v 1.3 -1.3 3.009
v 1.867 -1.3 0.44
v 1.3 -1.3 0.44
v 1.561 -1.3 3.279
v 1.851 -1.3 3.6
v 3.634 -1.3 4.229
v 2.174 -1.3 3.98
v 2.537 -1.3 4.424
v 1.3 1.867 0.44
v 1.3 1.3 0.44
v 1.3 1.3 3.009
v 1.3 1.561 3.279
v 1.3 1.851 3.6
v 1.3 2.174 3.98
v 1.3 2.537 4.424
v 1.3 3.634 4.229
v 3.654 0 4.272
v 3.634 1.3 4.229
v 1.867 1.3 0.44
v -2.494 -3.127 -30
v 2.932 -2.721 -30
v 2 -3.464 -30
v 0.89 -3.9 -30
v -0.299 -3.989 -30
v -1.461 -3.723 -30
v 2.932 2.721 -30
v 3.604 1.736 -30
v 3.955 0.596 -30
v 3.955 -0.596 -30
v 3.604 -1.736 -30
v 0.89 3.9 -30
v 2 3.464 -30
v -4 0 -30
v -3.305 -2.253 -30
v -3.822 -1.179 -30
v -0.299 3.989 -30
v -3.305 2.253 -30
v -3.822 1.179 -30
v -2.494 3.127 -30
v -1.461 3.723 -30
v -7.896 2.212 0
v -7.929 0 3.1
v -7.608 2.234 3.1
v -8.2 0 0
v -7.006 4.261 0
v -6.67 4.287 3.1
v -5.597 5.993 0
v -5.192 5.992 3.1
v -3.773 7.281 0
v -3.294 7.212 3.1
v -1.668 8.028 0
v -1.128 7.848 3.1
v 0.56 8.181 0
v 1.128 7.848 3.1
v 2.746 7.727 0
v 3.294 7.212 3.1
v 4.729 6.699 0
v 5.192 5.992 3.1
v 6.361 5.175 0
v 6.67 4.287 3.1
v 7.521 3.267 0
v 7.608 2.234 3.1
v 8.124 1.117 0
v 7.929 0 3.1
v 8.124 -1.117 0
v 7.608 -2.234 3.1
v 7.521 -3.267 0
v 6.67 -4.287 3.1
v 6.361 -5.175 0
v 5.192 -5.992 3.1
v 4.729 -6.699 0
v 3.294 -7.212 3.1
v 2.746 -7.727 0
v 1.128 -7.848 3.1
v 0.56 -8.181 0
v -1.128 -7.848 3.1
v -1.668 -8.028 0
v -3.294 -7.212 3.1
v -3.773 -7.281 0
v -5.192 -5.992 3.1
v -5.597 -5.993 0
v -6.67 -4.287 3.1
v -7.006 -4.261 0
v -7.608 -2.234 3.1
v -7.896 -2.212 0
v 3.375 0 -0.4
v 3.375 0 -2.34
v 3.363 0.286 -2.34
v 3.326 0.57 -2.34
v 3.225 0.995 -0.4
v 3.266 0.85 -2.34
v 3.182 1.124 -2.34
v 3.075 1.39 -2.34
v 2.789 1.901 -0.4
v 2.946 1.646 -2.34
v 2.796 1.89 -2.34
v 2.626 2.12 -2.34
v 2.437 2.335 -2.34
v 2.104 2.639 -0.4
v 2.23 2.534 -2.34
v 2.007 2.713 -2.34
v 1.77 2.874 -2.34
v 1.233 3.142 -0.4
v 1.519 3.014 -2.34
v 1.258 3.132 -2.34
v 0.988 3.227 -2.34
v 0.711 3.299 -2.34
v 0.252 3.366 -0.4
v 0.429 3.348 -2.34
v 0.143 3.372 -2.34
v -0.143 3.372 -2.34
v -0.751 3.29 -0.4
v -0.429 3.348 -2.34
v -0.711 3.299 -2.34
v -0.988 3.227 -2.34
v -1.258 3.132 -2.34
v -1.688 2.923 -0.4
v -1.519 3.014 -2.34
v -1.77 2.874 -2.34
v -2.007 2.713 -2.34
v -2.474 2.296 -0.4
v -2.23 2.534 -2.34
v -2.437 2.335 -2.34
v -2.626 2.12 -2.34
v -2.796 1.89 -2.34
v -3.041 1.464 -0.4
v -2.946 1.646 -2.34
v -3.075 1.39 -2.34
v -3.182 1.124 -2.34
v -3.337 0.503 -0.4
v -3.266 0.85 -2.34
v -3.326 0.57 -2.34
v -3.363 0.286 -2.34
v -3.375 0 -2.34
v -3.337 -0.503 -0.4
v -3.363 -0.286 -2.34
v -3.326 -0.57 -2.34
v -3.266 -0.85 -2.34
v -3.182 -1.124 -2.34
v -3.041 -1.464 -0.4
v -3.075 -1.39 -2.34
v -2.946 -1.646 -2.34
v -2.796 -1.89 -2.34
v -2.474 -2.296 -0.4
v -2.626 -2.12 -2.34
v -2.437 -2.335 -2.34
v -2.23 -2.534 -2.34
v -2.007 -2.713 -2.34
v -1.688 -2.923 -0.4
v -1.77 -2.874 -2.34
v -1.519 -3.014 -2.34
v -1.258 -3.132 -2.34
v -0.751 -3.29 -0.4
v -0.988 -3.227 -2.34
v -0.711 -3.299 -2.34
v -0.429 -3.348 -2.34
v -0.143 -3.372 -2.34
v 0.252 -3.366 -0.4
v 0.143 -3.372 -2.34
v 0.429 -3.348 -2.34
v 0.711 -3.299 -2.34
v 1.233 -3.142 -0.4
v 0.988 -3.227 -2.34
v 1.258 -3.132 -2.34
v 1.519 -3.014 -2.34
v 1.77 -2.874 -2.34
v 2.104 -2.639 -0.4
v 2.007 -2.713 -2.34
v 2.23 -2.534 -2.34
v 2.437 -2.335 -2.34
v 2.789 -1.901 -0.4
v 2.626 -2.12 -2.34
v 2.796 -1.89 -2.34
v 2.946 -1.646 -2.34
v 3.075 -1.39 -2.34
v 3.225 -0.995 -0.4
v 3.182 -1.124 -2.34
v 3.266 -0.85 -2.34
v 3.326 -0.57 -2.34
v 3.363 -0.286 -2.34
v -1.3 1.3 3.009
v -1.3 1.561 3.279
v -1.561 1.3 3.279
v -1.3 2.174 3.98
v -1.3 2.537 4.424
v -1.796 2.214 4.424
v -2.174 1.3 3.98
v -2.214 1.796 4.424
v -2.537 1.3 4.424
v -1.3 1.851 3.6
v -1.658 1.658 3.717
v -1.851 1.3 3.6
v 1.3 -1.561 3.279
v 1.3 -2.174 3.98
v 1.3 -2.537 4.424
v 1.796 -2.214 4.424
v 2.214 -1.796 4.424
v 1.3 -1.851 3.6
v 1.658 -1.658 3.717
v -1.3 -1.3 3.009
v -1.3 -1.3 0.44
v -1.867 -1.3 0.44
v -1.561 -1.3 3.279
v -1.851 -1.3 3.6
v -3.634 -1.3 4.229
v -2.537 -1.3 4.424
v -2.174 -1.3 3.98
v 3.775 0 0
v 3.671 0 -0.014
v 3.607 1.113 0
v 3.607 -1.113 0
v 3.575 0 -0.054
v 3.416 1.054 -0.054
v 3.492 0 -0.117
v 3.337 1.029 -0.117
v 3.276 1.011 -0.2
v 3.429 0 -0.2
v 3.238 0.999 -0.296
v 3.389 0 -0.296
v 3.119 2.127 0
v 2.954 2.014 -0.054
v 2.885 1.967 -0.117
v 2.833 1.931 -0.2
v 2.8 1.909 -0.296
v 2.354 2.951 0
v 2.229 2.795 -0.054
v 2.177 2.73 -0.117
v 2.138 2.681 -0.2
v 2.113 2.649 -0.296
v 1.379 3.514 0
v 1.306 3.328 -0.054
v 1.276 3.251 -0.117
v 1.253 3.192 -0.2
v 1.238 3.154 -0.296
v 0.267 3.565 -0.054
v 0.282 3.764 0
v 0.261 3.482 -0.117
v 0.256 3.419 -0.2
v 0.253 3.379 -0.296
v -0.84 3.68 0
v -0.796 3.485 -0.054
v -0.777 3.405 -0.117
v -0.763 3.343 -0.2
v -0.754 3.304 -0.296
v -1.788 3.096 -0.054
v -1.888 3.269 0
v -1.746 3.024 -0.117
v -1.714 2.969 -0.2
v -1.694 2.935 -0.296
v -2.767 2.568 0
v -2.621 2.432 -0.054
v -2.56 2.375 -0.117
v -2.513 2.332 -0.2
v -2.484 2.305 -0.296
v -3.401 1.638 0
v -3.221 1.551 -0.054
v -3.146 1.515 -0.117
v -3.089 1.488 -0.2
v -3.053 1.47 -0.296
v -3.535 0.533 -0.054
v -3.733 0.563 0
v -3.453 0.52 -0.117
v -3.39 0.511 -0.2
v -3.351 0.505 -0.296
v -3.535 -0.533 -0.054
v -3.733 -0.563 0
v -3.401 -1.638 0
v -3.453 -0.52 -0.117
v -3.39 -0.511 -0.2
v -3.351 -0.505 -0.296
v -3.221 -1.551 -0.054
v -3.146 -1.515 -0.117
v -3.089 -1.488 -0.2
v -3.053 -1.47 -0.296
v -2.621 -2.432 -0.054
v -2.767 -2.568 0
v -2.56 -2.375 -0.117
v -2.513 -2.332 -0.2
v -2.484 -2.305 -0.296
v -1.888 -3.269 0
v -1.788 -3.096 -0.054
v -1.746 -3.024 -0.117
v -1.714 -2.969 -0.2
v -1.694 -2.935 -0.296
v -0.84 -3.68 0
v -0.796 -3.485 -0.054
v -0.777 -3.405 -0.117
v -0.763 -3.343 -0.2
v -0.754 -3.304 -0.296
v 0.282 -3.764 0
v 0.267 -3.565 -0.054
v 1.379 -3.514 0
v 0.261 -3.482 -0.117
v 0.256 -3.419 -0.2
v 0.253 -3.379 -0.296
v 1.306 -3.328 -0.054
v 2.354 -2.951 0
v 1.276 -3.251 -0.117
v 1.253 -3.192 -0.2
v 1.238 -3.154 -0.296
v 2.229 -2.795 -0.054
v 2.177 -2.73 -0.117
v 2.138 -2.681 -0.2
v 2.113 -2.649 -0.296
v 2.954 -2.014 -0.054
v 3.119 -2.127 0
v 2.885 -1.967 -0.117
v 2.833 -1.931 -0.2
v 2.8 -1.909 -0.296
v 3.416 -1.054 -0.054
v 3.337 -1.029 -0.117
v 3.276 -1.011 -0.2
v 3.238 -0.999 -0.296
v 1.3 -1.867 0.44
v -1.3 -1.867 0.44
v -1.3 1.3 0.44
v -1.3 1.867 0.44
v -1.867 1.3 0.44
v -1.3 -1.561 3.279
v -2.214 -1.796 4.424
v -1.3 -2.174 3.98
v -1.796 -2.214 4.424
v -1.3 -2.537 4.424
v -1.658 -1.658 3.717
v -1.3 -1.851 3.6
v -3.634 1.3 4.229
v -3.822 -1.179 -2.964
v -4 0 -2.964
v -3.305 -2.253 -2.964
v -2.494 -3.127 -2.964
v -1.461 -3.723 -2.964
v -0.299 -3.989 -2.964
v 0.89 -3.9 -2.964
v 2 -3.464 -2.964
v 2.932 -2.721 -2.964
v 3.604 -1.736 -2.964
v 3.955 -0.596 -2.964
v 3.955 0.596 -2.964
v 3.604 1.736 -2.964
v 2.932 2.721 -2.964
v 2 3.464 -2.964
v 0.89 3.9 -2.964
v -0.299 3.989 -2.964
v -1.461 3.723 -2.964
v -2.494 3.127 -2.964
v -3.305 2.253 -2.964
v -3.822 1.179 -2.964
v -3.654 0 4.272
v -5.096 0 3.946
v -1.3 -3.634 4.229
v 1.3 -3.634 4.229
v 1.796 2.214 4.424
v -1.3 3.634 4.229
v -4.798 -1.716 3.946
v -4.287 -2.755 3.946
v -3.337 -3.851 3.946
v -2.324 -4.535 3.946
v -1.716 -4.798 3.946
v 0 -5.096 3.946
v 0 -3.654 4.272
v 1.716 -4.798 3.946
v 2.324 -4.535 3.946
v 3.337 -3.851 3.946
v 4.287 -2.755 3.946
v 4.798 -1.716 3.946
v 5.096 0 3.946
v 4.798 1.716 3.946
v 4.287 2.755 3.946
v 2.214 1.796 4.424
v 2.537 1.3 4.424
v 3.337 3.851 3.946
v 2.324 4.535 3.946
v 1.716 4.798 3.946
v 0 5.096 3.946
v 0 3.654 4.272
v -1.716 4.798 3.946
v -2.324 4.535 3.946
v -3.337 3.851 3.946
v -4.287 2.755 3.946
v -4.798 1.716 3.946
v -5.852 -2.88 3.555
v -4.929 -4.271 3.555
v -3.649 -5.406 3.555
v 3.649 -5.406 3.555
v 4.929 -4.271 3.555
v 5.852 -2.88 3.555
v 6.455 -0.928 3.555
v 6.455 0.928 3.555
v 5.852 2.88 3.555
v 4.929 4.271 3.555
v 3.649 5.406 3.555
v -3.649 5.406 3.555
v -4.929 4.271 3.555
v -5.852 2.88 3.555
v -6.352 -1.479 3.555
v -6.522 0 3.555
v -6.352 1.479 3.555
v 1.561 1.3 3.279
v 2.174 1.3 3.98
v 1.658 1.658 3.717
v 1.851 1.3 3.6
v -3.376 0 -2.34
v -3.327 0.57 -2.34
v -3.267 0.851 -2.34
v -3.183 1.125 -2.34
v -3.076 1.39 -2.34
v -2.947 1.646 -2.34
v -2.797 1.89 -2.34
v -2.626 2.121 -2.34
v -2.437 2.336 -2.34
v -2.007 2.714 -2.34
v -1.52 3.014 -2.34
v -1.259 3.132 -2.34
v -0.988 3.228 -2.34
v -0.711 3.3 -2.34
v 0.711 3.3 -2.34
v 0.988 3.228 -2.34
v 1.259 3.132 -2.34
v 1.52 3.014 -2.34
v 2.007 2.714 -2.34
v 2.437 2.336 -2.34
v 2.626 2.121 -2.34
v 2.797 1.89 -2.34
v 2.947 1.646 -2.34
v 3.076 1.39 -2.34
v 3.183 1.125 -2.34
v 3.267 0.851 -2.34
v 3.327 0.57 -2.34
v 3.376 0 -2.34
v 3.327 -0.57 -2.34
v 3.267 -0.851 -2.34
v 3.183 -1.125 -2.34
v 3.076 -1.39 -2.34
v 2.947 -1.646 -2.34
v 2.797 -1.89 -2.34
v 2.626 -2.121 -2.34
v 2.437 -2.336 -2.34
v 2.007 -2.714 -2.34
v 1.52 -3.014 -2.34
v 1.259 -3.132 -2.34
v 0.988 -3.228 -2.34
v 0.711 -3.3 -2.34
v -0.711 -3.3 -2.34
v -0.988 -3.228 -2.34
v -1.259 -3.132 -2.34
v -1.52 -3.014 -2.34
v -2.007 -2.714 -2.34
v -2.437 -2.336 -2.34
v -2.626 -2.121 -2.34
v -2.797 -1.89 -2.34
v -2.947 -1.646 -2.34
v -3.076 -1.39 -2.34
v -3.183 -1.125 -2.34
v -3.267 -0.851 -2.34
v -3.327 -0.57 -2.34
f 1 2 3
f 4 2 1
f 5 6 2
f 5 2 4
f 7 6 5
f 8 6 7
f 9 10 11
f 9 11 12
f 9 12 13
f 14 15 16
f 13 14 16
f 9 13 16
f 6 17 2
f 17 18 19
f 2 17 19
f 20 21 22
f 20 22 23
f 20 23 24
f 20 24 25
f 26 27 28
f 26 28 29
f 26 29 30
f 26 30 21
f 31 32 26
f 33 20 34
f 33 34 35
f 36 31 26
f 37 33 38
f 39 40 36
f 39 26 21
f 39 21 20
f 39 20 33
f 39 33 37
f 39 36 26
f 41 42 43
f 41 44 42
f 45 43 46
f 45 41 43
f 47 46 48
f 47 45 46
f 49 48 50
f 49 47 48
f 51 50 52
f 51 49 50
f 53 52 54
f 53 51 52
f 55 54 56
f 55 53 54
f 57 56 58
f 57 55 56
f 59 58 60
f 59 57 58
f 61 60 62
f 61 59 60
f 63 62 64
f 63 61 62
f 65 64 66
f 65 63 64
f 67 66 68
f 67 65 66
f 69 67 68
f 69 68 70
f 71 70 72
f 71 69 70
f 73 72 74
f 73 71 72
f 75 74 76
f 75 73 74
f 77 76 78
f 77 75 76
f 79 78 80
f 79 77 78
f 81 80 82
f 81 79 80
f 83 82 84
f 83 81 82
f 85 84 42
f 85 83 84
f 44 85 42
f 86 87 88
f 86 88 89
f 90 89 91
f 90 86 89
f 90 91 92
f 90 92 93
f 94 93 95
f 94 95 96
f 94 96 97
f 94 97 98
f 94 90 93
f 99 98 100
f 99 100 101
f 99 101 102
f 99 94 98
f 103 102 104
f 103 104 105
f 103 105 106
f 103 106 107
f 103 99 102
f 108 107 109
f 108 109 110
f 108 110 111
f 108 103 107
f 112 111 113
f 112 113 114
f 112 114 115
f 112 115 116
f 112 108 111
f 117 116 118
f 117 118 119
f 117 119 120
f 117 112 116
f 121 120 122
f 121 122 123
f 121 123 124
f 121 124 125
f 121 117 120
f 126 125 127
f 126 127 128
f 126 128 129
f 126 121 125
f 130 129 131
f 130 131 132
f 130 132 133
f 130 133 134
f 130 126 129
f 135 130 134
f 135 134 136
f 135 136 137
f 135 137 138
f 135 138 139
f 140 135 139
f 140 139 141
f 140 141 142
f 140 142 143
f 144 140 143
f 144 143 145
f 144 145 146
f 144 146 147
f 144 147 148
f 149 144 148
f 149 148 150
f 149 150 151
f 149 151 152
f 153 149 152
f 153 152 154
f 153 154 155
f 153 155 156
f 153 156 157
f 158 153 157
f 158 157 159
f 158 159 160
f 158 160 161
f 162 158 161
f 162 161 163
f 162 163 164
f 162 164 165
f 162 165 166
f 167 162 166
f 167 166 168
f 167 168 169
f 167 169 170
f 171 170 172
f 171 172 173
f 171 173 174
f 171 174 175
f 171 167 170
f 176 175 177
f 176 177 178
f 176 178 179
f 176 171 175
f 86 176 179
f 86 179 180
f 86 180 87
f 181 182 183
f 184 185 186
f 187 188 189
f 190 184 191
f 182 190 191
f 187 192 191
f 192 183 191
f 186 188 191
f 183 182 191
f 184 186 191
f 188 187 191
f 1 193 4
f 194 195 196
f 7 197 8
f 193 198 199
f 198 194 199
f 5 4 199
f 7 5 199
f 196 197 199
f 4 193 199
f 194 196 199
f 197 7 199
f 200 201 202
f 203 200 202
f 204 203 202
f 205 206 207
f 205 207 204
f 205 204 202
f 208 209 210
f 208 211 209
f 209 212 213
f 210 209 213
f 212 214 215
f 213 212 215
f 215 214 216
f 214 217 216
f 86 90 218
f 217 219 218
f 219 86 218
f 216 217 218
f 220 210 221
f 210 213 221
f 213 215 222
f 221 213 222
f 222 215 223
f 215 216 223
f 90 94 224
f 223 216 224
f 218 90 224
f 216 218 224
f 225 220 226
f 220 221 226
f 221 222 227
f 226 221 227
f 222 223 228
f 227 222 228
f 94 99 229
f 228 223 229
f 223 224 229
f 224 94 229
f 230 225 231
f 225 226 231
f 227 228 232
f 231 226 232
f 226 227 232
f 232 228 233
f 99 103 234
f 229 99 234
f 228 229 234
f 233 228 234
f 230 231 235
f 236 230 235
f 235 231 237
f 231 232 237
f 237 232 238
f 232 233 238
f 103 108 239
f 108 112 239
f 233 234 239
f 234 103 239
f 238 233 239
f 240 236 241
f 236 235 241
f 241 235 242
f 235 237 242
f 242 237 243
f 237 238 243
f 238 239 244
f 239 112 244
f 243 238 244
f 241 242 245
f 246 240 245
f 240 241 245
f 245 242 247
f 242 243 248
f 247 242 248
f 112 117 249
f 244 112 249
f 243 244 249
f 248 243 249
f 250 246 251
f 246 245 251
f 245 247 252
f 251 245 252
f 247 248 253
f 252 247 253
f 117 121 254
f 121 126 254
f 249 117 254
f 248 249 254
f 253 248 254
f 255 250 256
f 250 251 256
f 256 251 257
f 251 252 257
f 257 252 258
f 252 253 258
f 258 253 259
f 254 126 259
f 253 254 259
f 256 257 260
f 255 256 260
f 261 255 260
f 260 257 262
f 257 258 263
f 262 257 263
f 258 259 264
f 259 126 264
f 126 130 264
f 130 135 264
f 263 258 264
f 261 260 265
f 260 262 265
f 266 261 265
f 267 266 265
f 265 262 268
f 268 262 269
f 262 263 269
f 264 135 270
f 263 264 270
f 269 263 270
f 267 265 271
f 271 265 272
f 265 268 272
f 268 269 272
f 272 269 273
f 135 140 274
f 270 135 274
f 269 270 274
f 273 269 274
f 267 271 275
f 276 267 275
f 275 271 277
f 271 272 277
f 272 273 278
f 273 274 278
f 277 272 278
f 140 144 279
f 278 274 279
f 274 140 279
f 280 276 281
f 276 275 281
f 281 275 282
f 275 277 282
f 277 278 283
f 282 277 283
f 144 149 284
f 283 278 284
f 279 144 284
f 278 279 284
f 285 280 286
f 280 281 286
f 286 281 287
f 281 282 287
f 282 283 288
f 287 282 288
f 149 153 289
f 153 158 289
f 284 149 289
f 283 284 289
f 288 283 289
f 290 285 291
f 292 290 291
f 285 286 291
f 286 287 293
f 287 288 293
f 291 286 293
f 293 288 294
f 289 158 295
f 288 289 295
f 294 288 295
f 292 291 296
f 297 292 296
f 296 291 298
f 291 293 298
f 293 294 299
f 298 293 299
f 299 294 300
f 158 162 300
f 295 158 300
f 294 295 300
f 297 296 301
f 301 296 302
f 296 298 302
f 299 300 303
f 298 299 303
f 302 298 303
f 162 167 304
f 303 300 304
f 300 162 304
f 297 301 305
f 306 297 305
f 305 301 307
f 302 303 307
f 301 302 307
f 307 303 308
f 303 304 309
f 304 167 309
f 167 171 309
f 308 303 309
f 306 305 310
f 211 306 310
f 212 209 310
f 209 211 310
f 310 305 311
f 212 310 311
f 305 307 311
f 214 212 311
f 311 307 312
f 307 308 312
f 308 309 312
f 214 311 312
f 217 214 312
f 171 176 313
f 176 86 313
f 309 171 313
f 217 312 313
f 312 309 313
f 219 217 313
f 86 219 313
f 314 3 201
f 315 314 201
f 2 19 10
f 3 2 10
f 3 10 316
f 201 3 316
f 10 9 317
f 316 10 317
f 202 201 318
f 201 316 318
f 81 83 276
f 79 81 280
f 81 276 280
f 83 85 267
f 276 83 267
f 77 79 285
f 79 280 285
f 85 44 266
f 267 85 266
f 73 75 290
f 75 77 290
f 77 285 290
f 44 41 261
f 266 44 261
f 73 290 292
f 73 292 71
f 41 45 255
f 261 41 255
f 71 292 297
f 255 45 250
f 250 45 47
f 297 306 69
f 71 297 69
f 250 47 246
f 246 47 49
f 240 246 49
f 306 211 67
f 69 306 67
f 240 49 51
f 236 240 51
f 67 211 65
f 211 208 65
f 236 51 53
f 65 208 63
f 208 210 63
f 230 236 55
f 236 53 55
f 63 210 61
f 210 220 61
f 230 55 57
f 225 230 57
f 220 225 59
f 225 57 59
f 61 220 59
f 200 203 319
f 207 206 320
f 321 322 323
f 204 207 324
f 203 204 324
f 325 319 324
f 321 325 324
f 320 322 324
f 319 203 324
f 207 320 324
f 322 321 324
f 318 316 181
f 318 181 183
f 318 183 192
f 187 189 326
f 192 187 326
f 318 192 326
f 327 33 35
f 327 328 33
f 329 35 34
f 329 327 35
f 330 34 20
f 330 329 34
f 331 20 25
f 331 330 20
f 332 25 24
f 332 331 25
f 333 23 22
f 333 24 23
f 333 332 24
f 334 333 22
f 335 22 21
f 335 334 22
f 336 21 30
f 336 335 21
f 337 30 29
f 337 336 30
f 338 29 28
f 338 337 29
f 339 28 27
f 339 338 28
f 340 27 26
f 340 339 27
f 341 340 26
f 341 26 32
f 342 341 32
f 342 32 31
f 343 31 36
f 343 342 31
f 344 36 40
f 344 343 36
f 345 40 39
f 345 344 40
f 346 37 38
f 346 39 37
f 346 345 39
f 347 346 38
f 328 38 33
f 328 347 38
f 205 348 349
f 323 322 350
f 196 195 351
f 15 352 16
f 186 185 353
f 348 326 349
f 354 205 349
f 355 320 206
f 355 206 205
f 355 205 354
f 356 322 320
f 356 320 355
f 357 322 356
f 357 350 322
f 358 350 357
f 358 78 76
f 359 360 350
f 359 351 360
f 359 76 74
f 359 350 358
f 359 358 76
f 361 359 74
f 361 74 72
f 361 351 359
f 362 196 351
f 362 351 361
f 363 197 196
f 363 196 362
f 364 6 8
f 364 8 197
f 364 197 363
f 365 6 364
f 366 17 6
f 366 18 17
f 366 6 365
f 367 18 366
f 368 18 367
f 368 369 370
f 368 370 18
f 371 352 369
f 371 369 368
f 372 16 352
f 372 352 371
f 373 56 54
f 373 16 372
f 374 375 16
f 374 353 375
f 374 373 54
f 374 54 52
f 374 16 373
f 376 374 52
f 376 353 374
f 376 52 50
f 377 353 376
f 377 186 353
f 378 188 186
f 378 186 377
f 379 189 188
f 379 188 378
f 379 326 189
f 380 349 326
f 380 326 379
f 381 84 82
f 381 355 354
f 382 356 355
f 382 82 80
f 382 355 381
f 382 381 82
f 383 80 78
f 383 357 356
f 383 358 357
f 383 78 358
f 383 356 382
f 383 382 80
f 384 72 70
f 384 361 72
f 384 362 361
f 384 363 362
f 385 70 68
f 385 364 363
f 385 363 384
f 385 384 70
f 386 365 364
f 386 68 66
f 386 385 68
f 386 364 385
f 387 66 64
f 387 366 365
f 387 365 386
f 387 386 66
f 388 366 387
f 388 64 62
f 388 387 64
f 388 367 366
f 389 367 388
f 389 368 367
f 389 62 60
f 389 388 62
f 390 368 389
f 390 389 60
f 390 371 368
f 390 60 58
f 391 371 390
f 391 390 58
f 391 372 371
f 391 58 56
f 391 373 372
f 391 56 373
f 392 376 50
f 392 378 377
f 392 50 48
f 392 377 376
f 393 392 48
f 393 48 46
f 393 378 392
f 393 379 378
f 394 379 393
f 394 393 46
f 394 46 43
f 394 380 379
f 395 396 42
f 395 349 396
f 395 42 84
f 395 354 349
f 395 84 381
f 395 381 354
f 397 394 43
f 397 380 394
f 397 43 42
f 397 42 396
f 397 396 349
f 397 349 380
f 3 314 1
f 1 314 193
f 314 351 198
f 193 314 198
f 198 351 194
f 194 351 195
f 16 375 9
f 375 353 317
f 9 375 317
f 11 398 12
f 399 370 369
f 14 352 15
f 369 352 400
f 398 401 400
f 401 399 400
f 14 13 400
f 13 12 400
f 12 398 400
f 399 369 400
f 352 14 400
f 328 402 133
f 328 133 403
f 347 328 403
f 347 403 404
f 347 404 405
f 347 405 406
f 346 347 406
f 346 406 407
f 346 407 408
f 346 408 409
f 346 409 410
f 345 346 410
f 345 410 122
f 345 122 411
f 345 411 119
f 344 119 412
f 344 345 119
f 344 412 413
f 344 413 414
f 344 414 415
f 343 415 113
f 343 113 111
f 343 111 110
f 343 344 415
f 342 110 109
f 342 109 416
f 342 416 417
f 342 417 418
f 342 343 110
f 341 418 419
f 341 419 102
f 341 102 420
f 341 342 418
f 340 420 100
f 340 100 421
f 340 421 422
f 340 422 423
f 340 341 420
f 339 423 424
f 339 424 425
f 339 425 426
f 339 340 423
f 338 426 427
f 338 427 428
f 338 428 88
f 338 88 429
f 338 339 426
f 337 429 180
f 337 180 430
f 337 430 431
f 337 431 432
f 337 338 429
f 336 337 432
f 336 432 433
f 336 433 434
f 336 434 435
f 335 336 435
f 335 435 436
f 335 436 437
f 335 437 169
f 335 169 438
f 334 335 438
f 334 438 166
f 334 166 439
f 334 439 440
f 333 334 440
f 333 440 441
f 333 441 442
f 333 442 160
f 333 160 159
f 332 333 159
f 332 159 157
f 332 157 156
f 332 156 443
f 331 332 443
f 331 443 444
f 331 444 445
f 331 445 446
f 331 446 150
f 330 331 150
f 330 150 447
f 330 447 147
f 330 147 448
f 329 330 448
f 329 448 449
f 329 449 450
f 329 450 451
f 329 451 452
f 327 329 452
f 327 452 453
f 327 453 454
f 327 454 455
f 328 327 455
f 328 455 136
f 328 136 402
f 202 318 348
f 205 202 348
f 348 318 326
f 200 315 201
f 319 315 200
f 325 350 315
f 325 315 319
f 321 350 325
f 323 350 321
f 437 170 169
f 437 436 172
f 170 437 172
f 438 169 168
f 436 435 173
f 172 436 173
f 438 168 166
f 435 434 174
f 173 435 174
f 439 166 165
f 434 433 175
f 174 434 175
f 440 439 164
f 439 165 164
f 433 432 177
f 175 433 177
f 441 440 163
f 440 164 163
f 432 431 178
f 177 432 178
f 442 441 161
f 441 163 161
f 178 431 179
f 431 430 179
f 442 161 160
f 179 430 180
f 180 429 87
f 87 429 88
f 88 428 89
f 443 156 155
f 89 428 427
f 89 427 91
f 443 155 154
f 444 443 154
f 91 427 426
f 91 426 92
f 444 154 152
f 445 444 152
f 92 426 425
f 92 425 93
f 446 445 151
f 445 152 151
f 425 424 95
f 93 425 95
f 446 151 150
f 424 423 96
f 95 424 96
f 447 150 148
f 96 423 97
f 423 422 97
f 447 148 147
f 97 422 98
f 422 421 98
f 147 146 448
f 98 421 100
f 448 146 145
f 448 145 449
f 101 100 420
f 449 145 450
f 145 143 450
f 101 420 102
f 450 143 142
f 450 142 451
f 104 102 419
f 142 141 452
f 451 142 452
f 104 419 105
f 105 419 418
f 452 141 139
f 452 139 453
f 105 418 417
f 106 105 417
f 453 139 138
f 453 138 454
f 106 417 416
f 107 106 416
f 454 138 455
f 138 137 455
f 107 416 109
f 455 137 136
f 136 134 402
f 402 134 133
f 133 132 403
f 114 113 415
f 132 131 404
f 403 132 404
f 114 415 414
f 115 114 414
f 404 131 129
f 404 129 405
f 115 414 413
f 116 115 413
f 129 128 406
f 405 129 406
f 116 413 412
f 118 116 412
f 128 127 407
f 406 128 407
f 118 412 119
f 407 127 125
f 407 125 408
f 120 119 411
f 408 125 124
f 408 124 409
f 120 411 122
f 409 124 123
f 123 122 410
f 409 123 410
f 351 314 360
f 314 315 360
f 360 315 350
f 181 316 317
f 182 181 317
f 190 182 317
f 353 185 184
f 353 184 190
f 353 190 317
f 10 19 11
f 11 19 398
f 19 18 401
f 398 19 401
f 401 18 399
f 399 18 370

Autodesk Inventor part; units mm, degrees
ref_plane "YZ Plane" through (0, 0, 0) normal (1, 0, 0) x (0, 1, 0)
sketch "Эскиз2" plane through (0, 0, 0) normal (0, 0, 1) x (1, 0, 0)
  circle A0 centre (0, 0) radius 3.375
  dimension "d3" = 6.75
extrude "Выдавливание1" add sketch "Эскиз2" against normal blind 2.34
sketch "Эскиз3" plane through (0, 0, -2.34) normal (0, 0, -1) x (-1, 0, 0)
  circle A0 centre (0, 0) radius 4
  circle A1 centre (0, 0) radius 3.375 construction
  dimension "d28" = 360
  dimension "d9" = 8
extrude "Выдавливание2" add sketch "Эскиз3" along normal blind 27.66
chamfer "Фаска1" distance 0.625 distance2 0.625 1 edges at (4, 0, -2.34) measured on face at (-3.7202, -0.5883, -2.34)
sketch "Эскиз4" plane through (0, 0, 0) normal (0, 0, 1) x (1, 0, 0)
  circle A0 centre (0, 0) radius 8.2
  circle A1 centre (0, 0) radius 3.375 construction
  dimension "d15" = 16.4
extrude "Выдавливание3" add sketch "Эскиз4" along normal blind 3.1
fillet "Сопряжение1" radius 0.4 1 edges at (-3.375, 0, 0)
sketch "Эскиз5" plane through (0, 0, 0) normal (0, 1, 0) x (-1, 0, 0)
  line L0 (8.2, 3.1) -> (8.2, 0)
  line L1 (7.9288, 3.1) -> (8.2, 3.1)
  line L2 (8.2, 0) -> (7.9288, 3.1)
  line L3 (-8.2, 3.1) -> (8.2, 3.1) construction
  line L4 (-8.2, 0) -> (8.2, 0) construction
  line L5 (0, -0.62) -> (0, 3.72) projected
  line L6 (11.48, 0) -> (-11.48, 0) projected
  dimension "d20" = 5
  dimension "d56" = 8.2
  dimension "d57" = 3.1
revolve "Вращение1" cut sketch "Эскиз5" angle 360 about axis through (0, 0, -10) along (0, 0, 1)
sketch "Эскиз6" plane through (0, 0, 0) normal (0, 1, 0) x (-1, 0, 0)
  line L0 (0, 4.8) -> (0, 3.1)
  arc A0 (7.9288, 3.1) -> (0, 4.8) centre (-2.8592, -27.8751) ccw
  line L1 (0, 3.1) -> (7.9288, 3.1)
  line L2 (7.9288, 3.1) -> (-7.9288, 3.1) construction
  line L3 (0, -4.4495) -> (0, 0.4495)
  line L4 (0, -34.4594) -> (0, 11.6302) projected
  line L5 (11.1636, 0) -> (-11.1108, 0) projected
  dimension "d58" = 1.7
  dimension "d59" = 7.9288
  dimension "d60" = 0
  dimension "d62" = 32.8
revolve "Вращение2" add sketch "Эскиз6" angle 360 about axis through (0, 0, -4.4495) along (0, 0, 1)
sketch "Эскиз7" plane through (0, 0, 0) normal (0, 1, 0) x (-1, 0, 0)
  line L0 (3.9, 4.8) -> (-3.9, 4.8)
  line L1 (1.8669, 0.44) -> (3.9, 4.8)
  line L2 (-1.8669, 0.44) -> (1.8669, 0.44)
  line L3 (-3.9, 4.8) -> (-1.8669, 0.44)
  line L4 (0, -0.432) -> (0, 5.672) projected
  line L5 (5.46, 0) -> (-5.46, 0) projected
  dimension "d32" = 4.36
  dimension "d34" = 65
  dimension "d36" = 65
  dimension "d63" = 3.9
  dimension "d64" = 4.8
  dimension "d65" = 7.8
extrude "Выдавливание4" cut sketch "Эскиз7" against normal mid plane 2.6
sketch "Эскиз8" plane through (0, 0, 0) normal (1, 0, 0) x (0, 1, 0)
  line L0 (-1.8669, 0.44) -> (-3.9, 4.8)
  line L1 (1.8669, 0.44) -> (-1.8669, 0.44)
  line L2 (3.9, 4.8) -> (1.8669, 0.44)
  line L3 (-3.9, 4.8) -> (3.9, 4.8)
  line L4 (0, -0.432) -> (0, 5.672) projected
  line L5 (-5.46, 0) -> (5.46, 0) projected
  dimension "d40" = 65
  dimension "d42" = 65
  dimension "d44" = 4.36
  dimension "d66" = 7.8
  dimension "d67" = 4.8
  dimension "d69" = 3.9
extrude "Выдавливание5" cut sketch "Эскиз8" along normal mid plane 2.6
sketch "Эскиз9" plane through (0, 0, 0) normal (0, 1, 0) x (-1, 0, 0)
  line L0 (0, 4.8) -> (0, 0.44)
  line L1 (3.12, 4.8) -> (0, 4.8)
  line L2 (0, 0.44) -> (3.12, 4.8)
  line L3 (-8.2, 0) -> (8.2, 0) construction
  line L4 (0, -0.96) -> (0, 5.76) projected
  line L5 (11.48, 0) -> (-11.48, 0) projected
  dimension "d50" = 4.36
  dimension "d52" = 4.36
  dimension "d54" = 3.12
  dimension "d70" = 0
  dimension "d71" = 4.8
revolve "Вращение3" cut sketch "Эскиз9" angle 360 about axis through (0, 0, -10) along (0, 0, 1)
thread "Резьба1" size "M8x1.25" class "6g" standard "ISO Metric profile" full length
ref_plane "MSC_PF1" through (0, 0, 0) normal (1, 0, 0) x (0, 1, 0)
ref_plane "MSC_PT1" through (0, 0, 0) normal (0, 0, -1) x (-1, 0, 0)
equation "\"d4\" = -b + NLG"
equation "\"d9\" = NND"
equation "\"d10\" = b"
equation "\"d12\" = -0.5 * msp_ds + 0.5 * NND"
equation "\"d13\" = 0.5 * NND - 0.5 * msp_ds"
equation "\"d15\" = Dk"
equation "\"d16\" = ParK"
equation "\"d18\" = r"
equation "\"d32\" = q"
equation "\"d63\" = 0.5 * M"
equation "\"d64\" = ParK + ParF"
equation "\"d65\" = M"
equation "\"d37\" = 2 * msp_s"
equation "\"d44\" = q"
equation "\"d66\" = M"
equation "\"d67\" = ParK + ParF"
equation "\"d69\" = 0.5 * M"
equation "\"d47\" = 2 * msp_s"
equation "\"d3\" = msp_ds"
equation "\"d56\" = 0.5 * Dk"
equation "\"d57\" = ParK"
equation "\"d58\" = ParF"
equation "\"d59\" = 0.5 * Dk - msp_v"
equation "\"d62\" = 2 * Dk"
equation "\"d50\" = q"
equation "\"d52\" = q"
equation "\"d54\" = msp_rr"
equation "\"d71\" = ParK + ParF"
equation "\"PTC\" = 1.25"
equation "\"NLG\" = 30"
equation "\"Dk\" = 16.4"
equation "\"ParK\" = 3.1"
equation "\"NND\" = 8"
equation "\"M\" = 7.8"
equation "\"q\" = 4.36"
equation "\"r\" = 0.4"
equation "\"msp_ds\" = NND - PTC"
equation "\"b\" = 27.66"
equation "\"msp_x\" = 1.25 * PTC"
equation "\"msp_s\" = 0.166667 * M"
equation "\"msp_rr\" = 0.4 * M"
equation "\"ParF\" = 1.7"
equation "\"msp_v\" = 0.0874887 * ParK"
equation "\"THREADDIA\" = NND"
properties part number "JIS B 1111 - M8x30" material "Сталь, мягкая"
